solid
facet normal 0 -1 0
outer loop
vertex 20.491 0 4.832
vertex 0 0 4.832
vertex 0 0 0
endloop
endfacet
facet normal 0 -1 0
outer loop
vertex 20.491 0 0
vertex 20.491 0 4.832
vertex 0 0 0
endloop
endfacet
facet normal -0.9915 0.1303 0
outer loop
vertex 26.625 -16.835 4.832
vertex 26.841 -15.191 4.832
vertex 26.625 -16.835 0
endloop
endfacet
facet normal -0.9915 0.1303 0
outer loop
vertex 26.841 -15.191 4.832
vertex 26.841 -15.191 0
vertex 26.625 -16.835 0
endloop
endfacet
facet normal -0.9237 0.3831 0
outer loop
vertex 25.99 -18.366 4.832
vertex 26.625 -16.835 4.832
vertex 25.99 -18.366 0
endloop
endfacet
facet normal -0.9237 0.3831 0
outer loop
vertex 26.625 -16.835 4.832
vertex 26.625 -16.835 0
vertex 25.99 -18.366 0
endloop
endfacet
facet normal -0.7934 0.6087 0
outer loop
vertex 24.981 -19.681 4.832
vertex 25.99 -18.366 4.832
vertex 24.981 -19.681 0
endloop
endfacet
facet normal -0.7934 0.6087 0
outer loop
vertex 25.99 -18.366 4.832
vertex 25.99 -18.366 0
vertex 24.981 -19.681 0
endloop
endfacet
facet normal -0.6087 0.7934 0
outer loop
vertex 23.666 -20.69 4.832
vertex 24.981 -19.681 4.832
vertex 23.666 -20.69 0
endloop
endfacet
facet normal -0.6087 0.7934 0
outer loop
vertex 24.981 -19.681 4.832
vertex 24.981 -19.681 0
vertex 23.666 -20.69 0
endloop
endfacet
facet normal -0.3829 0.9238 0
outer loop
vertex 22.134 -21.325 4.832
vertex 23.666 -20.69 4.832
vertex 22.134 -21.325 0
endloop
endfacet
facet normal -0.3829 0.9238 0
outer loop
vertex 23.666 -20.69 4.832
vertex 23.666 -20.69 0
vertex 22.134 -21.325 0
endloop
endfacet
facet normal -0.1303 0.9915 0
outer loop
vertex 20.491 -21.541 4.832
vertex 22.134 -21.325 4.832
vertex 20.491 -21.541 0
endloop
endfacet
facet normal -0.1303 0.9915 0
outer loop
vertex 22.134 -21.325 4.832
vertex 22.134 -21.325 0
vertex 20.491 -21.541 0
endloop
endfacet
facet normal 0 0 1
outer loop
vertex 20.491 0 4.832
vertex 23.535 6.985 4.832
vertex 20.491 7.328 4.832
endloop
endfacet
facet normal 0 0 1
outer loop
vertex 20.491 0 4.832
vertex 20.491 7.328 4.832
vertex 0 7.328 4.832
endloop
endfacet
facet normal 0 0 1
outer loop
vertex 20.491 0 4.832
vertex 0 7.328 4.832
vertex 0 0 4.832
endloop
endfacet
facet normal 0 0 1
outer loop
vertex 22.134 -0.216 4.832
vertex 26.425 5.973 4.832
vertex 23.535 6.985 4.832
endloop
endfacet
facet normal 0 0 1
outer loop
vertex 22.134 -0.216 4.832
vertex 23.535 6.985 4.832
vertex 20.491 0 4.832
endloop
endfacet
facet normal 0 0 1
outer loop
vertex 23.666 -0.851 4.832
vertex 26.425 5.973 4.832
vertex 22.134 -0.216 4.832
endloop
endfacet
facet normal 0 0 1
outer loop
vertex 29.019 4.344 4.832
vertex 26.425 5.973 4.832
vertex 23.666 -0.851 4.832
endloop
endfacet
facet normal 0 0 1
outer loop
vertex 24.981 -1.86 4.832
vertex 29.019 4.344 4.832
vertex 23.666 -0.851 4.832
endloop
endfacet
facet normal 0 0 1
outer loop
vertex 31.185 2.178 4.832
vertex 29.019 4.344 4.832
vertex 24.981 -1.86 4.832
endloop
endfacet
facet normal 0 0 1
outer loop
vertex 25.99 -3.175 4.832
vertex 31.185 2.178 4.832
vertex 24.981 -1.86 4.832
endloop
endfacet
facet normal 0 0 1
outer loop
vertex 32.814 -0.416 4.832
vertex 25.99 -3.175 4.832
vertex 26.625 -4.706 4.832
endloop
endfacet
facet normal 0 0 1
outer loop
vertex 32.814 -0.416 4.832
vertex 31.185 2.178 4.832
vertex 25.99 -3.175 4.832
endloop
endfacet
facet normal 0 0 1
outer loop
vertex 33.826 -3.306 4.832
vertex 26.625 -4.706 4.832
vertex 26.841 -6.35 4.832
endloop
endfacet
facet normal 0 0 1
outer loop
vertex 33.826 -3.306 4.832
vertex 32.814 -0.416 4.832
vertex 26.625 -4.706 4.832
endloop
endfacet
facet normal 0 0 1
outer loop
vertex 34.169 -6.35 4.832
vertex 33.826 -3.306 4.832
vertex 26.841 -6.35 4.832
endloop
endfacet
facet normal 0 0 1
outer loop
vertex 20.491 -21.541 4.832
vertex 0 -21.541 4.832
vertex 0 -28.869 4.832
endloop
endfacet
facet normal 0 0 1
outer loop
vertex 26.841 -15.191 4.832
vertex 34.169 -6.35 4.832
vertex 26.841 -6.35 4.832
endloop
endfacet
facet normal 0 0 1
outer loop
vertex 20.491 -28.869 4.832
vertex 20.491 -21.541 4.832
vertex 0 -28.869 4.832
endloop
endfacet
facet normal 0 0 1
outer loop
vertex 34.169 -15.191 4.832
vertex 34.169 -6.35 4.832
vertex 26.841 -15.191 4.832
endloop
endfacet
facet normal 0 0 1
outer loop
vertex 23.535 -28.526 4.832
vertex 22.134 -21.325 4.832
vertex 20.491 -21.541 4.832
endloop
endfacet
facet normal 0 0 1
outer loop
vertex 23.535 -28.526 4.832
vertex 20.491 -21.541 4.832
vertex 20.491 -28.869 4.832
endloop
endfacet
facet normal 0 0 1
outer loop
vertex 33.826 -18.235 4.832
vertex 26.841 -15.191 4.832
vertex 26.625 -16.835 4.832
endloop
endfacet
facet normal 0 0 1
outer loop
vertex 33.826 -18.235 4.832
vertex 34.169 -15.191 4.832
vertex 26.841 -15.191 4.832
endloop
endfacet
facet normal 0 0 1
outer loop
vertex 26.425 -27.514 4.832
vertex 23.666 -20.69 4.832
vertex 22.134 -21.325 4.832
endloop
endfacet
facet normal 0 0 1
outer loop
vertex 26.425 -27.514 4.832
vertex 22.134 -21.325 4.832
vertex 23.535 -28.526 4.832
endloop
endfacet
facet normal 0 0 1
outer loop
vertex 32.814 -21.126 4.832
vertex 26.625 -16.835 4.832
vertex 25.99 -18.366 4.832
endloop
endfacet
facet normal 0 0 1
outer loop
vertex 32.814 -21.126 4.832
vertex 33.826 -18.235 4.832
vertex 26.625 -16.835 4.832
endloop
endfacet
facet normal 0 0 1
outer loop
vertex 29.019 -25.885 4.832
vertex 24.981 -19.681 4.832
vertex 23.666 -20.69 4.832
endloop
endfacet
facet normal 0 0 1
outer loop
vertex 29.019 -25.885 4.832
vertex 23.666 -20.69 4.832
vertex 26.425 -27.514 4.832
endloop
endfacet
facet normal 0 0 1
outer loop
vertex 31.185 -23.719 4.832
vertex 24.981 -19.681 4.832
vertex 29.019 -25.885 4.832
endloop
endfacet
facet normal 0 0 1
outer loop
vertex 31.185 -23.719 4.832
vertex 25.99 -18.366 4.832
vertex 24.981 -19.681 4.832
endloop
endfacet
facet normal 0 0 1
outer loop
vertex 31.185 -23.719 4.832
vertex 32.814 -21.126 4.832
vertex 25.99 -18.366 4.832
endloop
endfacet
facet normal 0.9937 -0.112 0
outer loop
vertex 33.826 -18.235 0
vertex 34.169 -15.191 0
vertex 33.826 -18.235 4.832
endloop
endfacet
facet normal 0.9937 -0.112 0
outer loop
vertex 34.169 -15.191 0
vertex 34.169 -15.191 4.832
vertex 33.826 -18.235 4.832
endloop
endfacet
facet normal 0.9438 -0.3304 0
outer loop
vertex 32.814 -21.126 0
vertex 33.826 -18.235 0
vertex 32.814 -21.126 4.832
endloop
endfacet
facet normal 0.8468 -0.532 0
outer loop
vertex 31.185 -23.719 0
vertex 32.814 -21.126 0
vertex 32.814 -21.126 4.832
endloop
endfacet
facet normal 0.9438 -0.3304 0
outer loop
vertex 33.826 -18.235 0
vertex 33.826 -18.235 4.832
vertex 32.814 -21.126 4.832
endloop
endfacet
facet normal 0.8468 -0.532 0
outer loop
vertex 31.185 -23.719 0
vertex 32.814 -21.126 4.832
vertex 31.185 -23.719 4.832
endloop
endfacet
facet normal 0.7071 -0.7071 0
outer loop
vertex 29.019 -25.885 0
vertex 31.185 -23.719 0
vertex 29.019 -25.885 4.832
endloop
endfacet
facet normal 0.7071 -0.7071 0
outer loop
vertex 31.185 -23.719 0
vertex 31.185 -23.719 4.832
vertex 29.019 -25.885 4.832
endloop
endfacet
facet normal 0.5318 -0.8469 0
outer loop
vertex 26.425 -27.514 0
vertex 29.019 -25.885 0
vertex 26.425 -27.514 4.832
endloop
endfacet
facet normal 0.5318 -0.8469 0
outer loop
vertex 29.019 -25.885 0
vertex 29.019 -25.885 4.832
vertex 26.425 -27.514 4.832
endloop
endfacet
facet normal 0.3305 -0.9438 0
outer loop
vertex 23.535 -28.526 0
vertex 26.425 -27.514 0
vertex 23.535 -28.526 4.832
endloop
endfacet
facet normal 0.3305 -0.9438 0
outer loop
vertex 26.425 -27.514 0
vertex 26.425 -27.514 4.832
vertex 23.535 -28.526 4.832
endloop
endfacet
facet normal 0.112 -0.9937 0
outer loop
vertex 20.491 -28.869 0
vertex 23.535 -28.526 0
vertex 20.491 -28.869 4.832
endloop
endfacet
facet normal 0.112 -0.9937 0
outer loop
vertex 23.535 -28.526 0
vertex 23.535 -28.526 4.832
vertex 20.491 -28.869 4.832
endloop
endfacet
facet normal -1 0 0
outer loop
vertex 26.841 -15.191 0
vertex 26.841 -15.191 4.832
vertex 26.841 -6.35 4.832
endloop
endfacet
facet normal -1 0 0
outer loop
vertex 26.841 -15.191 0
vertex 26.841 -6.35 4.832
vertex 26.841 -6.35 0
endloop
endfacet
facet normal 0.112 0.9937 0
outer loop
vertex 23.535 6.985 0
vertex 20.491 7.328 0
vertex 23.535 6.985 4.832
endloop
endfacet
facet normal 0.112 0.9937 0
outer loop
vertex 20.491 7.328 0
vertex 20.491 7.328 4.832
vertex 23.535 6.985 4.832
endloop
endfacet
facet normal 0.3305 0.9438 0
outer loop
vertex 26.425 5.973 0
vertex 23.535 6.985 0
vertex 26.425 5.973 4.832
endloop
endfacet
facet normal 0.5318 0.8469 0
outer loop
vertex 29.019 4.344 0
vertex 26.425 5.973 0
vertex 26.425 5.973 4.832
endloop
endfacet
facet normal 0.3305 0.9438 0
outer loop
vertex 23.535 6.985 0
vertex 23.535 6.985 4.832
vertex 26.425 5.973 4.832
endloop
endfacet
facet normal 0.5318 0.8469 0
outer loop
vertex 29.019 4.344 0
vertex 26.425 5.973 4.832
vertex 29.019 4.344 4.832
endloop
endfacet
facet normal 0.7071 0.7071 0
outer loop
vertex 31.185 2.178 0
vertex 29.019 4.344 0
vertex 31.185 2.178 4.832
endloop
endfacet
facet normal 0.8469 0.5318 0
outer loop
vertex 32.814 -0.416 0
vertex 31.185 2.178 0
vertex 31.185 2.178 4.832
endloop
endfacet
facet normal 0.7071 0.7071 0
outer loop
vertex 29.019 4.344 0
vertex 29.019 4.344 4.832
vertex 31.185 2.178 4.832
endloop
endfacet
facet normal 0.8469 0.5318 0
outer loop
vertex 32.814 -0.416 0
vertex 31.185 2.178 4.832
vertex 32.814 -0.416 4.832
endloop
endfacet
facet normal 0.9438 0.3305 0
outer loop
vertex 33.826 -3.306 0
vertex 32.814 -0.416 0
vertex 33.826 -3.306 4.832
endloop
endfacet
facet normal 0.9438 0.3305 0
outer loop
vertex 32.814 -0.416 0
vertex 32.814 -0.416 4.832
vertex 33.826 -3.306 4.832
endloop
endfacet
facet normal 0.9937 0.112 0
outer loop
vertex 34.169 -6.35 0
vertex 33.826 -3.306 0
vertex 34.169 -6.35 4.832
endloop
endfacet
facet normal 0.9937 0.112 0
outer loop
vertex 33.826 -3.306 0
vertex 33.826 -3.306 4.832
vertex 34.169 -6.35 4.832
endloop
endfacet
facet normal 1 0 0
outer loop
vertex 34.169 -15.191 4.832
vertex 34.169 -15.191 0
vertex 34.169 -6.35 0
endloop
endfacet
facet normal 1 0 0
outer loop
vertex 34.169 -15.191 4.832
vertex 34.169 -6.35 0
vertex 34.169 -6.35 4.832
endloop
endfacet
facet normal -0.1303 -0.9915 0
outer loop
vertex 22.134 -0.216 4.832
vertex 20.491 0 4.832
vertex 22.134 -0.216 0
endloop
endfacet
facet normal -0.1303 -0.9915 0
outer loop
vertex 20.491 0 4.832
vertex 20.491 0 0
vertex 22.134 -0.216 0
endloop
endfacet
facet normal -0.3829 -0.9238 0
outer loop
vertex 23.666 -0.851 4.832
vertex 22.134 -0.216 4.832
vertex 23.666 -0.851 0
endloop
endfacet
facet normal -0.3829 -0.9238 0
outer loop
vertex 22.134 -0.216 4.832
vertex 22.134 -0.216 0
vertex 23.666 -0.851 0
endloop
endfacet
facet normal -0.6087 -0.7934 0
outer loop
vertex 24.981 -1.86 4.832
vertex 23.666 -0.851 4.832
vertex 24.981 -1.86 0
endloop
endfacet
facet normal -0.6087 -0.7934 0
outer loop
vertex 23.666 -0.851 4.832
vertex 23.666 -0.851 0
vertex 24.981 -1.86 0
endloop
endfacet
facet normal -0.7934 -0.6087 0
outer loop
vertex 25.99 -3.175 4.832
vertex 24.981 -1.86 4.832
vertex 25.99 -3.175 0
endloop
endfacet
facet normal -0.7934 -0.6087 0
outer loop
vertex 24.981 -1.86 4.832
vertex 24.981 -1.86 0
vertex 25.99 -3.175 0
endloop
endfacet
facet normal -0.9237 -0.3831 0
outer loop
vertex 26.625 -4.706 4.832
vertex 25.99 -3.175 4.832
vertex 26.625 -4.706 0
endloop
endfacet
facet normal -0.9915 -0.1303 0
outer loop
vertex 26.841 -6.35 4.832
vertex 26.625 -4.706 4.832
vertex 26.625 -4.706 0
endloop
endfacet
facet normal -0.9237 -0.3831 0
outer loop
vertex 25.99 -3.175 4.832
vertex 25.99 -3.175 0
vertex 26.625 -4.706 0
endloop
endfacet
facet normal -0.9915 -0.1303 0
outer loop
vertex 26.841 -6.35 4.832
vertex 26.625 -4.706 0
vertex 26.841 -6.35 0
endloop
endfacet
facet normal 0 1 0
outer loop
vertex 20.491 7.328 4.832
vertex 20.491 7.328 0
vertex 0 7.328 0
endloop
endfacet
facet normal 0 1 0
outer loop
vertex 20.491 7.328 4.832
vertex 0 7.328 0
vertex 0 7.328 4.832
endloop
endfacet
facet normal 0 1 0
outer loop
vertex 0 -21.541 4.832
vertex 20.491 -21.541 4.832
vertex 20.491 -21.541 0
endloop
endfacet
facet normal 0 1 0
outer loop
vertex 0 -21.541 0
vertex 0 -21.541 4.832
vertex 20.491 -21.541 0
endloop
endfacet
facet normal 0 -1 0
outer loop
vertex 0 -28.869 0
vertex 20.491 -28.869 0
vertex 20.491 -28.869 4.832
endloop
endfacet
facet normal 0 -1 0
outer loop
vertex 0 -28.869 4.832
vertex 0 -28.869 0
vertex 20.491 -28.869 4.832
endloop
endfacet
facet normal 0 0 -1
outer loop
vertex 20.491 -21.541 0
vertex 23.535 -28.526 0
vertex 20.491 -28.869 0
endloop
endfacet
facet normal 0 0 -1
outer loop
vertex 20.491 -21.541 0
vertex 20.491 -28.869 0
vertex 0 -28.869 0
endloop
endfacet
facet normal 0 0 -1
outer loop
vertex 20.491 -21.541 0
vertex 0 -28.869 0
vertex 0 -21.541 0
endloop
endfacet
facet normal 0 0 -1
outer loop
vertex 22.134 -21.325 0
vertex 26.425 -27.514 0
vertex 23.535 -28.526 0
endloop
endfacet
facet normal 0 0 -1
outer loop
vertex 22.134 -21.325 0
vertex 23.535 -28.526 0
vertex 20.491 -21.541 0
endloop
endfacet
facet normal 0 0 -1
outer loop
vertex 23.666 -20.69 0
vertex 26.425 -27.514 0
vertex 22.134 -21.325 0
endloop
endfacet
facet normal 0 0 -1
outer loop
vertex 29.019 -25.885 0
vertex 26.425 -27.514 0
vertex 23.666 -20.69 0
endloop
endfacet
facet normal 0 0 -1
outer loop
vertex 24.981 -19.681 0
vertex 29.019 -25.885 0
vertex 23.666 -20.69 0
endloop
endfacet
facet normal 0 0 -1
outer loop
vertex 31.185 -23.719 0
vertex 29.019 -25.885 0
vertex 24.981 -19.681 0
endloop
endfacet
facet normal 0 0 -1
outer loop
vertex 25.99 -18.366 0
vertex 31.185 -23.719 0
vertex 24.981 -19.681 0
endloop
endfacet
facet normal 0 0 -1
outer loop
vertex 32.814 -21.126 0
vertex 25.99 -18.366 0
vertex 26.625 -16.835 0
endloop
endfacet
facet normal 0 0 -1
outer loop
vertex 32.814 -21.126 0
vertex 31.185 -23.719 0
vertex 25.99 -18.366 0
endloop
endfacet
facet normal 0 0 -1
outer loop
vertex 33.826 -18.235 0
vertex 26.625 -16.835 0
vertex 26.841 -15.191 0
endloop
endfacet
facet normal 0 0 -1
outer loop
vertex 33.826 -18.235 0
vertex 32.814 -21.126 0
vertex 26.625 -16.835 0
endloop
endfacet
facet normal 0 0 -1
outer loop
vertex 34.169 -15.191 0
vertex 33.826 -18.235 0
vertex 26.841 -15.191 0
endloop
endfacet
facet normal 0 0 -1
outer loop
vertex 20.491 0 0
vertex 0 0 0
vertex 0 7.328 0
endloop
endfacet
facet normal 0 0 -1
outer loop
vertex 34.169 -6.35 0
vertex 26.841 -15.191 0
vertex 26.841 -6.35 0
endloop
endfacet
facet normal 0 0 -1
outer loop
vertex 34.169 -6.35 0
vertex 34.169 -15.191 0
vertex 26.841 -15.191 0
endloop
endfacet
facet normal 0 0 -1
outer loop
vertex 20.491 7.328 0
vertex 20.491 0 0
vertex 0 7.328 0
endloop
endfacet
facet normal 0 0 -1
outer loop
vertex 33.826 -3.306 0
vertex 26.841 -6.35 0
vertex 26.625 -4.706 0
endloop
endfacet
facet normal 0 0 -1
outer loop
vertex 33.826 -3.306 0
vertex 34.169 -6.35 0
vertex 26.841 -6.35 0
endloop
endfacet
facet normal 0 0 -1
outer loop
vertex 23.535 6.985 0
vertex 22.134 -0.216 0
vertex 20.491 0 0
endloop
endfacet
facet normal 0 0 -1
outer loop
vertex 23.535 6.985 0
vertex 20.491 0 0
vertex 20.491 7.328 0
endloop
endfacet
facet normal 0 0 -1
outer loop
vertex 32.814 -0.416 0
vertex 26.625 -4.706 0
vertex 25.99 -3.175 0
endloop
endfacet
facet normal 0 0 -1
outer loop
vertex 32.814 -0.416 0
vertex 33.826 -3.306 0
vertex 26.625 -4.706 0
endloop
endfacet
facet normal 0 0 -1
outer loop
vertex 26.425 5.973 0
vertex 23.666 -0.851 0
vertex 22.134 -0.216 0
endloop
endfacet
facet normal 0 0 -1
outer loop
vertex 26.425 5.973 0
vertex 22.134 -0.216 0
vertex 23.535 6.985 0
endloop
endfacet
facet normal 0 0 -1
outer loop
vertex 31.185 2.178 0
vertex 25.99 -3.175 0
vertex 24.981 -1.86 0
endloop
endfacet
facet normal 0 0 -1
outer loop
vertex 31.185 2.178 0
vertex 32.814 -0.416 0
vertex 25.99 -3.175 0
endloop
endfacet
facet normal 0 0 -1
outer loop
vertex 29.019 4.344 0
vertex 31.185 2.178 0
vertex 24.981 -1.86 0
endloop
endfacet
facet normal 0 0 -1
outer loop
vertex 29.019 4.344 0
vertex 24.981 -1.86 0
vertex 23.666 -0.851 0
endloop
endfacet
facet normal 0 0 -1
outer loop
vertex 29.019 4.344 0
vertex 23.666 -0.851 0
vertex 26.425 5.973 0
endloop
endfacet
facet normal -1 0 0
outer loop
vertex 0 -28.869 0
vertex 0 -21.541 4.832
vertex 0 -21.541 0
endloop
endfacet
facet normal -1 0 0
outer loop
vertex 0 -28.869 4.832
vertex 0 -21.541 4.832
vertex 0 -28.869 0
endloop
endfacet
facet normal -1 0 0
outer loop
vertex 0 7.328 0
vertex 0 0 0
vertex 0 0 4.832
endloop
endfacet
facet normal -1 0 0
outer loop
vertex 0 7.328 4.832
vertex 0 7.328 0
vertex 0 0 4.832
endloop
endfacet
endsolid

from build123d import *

# Parameters (mm, degrees)
F1_W = 7.327596
F1_H = 4.832284


with BuildPart() as f2:
    # F2: sweep along a path in F0
    with BuildLine(Plane.XY) as f2_path:
        Line((0, 0), (20.490962, 0))
        ThreePointArc((20.490962, 0), (24.981091, -1.859872), (26.840962, -6.35))
        Line((26.840962, -6.35), (26.840962, -15.191156))
        ThreePointArc((26.840962, -15.191156), (24.981091, -19.681284), (20.490962, -21.541156))
        Line((20.490962, -21.541156), (0, -21.541156))
    # F1 (on Right) → F2 (sweep)
    with BuildSketch(Plane.YZ):
        with Locations((3.663798, 2.416142)):
            Rectangle(F1_W, F1_H)
    sweep(path=f2_path.line)


solid = f2.part
